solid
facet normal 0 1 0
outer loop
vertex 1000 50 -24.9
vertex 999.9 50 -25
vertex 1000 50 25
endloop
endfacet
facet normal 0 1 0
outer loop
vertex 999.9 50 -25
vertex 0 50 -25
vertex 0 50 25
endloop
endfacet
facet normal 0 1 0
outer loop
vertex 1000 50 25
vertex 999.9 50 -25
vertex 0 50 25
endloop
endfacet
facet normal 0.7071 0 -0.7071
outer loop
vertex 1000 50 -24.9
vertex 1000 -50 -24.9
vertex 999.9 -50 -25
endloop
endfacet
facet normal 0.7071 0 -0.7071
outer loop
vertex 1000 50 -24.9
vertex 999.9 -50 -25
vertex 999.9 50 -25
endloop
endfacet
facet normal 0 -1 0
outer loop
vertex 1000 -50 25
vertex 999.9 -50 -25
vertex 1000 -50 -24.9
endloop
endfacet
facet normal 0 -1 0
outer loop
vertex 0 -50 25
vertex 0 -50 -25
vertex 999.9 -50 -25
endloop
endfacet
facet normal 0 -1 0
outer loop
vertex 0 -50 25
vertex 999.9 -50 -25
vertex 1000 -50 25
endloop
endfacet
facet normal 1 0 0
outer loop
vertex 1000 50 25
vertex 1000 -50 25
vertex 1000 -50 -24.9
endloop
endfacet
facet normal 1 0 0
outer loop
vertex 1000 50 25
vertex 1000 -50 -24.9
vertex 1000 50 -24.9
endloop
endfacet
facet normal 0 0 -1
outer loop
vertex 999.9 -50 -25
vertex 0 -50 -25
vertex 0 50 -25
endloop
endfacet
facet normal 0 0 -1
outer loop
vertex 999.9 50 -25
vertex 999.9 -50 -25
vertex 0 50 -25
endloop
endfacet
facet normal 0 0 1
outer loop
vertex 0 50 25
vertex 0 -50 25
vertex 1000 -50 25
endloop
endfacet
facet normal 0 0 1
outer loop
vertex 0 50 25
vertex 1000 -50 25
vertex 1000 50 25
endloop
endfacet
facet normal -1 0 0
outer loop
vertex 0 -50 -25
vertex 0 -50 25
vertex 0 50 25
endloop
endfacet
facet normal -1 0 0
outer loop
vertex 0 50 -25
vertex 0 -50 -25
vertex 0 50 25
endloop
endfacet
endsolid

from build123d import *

# Parameters (mm, degrees)
F0_W     = 100
F0_H     = 50
F1_DEPTH = 1000
F2_SIZE  = 0.1


with BuildPart() as f1:
    # F0 (on Right) → F1 (new body)
    with BuildSketch(Plane.YZ):
        Rectangle(F0_W, F0_H)
    extrude(amount=F1_DEPTH)

    # F2
    f2_edges = [f1.edges().sort_by_distance(p)[0] for p in [
        (1000, 0, -25),
    ]]
    chamfer(f2_edges, length=F2_SIZE)


solid = f1.part
